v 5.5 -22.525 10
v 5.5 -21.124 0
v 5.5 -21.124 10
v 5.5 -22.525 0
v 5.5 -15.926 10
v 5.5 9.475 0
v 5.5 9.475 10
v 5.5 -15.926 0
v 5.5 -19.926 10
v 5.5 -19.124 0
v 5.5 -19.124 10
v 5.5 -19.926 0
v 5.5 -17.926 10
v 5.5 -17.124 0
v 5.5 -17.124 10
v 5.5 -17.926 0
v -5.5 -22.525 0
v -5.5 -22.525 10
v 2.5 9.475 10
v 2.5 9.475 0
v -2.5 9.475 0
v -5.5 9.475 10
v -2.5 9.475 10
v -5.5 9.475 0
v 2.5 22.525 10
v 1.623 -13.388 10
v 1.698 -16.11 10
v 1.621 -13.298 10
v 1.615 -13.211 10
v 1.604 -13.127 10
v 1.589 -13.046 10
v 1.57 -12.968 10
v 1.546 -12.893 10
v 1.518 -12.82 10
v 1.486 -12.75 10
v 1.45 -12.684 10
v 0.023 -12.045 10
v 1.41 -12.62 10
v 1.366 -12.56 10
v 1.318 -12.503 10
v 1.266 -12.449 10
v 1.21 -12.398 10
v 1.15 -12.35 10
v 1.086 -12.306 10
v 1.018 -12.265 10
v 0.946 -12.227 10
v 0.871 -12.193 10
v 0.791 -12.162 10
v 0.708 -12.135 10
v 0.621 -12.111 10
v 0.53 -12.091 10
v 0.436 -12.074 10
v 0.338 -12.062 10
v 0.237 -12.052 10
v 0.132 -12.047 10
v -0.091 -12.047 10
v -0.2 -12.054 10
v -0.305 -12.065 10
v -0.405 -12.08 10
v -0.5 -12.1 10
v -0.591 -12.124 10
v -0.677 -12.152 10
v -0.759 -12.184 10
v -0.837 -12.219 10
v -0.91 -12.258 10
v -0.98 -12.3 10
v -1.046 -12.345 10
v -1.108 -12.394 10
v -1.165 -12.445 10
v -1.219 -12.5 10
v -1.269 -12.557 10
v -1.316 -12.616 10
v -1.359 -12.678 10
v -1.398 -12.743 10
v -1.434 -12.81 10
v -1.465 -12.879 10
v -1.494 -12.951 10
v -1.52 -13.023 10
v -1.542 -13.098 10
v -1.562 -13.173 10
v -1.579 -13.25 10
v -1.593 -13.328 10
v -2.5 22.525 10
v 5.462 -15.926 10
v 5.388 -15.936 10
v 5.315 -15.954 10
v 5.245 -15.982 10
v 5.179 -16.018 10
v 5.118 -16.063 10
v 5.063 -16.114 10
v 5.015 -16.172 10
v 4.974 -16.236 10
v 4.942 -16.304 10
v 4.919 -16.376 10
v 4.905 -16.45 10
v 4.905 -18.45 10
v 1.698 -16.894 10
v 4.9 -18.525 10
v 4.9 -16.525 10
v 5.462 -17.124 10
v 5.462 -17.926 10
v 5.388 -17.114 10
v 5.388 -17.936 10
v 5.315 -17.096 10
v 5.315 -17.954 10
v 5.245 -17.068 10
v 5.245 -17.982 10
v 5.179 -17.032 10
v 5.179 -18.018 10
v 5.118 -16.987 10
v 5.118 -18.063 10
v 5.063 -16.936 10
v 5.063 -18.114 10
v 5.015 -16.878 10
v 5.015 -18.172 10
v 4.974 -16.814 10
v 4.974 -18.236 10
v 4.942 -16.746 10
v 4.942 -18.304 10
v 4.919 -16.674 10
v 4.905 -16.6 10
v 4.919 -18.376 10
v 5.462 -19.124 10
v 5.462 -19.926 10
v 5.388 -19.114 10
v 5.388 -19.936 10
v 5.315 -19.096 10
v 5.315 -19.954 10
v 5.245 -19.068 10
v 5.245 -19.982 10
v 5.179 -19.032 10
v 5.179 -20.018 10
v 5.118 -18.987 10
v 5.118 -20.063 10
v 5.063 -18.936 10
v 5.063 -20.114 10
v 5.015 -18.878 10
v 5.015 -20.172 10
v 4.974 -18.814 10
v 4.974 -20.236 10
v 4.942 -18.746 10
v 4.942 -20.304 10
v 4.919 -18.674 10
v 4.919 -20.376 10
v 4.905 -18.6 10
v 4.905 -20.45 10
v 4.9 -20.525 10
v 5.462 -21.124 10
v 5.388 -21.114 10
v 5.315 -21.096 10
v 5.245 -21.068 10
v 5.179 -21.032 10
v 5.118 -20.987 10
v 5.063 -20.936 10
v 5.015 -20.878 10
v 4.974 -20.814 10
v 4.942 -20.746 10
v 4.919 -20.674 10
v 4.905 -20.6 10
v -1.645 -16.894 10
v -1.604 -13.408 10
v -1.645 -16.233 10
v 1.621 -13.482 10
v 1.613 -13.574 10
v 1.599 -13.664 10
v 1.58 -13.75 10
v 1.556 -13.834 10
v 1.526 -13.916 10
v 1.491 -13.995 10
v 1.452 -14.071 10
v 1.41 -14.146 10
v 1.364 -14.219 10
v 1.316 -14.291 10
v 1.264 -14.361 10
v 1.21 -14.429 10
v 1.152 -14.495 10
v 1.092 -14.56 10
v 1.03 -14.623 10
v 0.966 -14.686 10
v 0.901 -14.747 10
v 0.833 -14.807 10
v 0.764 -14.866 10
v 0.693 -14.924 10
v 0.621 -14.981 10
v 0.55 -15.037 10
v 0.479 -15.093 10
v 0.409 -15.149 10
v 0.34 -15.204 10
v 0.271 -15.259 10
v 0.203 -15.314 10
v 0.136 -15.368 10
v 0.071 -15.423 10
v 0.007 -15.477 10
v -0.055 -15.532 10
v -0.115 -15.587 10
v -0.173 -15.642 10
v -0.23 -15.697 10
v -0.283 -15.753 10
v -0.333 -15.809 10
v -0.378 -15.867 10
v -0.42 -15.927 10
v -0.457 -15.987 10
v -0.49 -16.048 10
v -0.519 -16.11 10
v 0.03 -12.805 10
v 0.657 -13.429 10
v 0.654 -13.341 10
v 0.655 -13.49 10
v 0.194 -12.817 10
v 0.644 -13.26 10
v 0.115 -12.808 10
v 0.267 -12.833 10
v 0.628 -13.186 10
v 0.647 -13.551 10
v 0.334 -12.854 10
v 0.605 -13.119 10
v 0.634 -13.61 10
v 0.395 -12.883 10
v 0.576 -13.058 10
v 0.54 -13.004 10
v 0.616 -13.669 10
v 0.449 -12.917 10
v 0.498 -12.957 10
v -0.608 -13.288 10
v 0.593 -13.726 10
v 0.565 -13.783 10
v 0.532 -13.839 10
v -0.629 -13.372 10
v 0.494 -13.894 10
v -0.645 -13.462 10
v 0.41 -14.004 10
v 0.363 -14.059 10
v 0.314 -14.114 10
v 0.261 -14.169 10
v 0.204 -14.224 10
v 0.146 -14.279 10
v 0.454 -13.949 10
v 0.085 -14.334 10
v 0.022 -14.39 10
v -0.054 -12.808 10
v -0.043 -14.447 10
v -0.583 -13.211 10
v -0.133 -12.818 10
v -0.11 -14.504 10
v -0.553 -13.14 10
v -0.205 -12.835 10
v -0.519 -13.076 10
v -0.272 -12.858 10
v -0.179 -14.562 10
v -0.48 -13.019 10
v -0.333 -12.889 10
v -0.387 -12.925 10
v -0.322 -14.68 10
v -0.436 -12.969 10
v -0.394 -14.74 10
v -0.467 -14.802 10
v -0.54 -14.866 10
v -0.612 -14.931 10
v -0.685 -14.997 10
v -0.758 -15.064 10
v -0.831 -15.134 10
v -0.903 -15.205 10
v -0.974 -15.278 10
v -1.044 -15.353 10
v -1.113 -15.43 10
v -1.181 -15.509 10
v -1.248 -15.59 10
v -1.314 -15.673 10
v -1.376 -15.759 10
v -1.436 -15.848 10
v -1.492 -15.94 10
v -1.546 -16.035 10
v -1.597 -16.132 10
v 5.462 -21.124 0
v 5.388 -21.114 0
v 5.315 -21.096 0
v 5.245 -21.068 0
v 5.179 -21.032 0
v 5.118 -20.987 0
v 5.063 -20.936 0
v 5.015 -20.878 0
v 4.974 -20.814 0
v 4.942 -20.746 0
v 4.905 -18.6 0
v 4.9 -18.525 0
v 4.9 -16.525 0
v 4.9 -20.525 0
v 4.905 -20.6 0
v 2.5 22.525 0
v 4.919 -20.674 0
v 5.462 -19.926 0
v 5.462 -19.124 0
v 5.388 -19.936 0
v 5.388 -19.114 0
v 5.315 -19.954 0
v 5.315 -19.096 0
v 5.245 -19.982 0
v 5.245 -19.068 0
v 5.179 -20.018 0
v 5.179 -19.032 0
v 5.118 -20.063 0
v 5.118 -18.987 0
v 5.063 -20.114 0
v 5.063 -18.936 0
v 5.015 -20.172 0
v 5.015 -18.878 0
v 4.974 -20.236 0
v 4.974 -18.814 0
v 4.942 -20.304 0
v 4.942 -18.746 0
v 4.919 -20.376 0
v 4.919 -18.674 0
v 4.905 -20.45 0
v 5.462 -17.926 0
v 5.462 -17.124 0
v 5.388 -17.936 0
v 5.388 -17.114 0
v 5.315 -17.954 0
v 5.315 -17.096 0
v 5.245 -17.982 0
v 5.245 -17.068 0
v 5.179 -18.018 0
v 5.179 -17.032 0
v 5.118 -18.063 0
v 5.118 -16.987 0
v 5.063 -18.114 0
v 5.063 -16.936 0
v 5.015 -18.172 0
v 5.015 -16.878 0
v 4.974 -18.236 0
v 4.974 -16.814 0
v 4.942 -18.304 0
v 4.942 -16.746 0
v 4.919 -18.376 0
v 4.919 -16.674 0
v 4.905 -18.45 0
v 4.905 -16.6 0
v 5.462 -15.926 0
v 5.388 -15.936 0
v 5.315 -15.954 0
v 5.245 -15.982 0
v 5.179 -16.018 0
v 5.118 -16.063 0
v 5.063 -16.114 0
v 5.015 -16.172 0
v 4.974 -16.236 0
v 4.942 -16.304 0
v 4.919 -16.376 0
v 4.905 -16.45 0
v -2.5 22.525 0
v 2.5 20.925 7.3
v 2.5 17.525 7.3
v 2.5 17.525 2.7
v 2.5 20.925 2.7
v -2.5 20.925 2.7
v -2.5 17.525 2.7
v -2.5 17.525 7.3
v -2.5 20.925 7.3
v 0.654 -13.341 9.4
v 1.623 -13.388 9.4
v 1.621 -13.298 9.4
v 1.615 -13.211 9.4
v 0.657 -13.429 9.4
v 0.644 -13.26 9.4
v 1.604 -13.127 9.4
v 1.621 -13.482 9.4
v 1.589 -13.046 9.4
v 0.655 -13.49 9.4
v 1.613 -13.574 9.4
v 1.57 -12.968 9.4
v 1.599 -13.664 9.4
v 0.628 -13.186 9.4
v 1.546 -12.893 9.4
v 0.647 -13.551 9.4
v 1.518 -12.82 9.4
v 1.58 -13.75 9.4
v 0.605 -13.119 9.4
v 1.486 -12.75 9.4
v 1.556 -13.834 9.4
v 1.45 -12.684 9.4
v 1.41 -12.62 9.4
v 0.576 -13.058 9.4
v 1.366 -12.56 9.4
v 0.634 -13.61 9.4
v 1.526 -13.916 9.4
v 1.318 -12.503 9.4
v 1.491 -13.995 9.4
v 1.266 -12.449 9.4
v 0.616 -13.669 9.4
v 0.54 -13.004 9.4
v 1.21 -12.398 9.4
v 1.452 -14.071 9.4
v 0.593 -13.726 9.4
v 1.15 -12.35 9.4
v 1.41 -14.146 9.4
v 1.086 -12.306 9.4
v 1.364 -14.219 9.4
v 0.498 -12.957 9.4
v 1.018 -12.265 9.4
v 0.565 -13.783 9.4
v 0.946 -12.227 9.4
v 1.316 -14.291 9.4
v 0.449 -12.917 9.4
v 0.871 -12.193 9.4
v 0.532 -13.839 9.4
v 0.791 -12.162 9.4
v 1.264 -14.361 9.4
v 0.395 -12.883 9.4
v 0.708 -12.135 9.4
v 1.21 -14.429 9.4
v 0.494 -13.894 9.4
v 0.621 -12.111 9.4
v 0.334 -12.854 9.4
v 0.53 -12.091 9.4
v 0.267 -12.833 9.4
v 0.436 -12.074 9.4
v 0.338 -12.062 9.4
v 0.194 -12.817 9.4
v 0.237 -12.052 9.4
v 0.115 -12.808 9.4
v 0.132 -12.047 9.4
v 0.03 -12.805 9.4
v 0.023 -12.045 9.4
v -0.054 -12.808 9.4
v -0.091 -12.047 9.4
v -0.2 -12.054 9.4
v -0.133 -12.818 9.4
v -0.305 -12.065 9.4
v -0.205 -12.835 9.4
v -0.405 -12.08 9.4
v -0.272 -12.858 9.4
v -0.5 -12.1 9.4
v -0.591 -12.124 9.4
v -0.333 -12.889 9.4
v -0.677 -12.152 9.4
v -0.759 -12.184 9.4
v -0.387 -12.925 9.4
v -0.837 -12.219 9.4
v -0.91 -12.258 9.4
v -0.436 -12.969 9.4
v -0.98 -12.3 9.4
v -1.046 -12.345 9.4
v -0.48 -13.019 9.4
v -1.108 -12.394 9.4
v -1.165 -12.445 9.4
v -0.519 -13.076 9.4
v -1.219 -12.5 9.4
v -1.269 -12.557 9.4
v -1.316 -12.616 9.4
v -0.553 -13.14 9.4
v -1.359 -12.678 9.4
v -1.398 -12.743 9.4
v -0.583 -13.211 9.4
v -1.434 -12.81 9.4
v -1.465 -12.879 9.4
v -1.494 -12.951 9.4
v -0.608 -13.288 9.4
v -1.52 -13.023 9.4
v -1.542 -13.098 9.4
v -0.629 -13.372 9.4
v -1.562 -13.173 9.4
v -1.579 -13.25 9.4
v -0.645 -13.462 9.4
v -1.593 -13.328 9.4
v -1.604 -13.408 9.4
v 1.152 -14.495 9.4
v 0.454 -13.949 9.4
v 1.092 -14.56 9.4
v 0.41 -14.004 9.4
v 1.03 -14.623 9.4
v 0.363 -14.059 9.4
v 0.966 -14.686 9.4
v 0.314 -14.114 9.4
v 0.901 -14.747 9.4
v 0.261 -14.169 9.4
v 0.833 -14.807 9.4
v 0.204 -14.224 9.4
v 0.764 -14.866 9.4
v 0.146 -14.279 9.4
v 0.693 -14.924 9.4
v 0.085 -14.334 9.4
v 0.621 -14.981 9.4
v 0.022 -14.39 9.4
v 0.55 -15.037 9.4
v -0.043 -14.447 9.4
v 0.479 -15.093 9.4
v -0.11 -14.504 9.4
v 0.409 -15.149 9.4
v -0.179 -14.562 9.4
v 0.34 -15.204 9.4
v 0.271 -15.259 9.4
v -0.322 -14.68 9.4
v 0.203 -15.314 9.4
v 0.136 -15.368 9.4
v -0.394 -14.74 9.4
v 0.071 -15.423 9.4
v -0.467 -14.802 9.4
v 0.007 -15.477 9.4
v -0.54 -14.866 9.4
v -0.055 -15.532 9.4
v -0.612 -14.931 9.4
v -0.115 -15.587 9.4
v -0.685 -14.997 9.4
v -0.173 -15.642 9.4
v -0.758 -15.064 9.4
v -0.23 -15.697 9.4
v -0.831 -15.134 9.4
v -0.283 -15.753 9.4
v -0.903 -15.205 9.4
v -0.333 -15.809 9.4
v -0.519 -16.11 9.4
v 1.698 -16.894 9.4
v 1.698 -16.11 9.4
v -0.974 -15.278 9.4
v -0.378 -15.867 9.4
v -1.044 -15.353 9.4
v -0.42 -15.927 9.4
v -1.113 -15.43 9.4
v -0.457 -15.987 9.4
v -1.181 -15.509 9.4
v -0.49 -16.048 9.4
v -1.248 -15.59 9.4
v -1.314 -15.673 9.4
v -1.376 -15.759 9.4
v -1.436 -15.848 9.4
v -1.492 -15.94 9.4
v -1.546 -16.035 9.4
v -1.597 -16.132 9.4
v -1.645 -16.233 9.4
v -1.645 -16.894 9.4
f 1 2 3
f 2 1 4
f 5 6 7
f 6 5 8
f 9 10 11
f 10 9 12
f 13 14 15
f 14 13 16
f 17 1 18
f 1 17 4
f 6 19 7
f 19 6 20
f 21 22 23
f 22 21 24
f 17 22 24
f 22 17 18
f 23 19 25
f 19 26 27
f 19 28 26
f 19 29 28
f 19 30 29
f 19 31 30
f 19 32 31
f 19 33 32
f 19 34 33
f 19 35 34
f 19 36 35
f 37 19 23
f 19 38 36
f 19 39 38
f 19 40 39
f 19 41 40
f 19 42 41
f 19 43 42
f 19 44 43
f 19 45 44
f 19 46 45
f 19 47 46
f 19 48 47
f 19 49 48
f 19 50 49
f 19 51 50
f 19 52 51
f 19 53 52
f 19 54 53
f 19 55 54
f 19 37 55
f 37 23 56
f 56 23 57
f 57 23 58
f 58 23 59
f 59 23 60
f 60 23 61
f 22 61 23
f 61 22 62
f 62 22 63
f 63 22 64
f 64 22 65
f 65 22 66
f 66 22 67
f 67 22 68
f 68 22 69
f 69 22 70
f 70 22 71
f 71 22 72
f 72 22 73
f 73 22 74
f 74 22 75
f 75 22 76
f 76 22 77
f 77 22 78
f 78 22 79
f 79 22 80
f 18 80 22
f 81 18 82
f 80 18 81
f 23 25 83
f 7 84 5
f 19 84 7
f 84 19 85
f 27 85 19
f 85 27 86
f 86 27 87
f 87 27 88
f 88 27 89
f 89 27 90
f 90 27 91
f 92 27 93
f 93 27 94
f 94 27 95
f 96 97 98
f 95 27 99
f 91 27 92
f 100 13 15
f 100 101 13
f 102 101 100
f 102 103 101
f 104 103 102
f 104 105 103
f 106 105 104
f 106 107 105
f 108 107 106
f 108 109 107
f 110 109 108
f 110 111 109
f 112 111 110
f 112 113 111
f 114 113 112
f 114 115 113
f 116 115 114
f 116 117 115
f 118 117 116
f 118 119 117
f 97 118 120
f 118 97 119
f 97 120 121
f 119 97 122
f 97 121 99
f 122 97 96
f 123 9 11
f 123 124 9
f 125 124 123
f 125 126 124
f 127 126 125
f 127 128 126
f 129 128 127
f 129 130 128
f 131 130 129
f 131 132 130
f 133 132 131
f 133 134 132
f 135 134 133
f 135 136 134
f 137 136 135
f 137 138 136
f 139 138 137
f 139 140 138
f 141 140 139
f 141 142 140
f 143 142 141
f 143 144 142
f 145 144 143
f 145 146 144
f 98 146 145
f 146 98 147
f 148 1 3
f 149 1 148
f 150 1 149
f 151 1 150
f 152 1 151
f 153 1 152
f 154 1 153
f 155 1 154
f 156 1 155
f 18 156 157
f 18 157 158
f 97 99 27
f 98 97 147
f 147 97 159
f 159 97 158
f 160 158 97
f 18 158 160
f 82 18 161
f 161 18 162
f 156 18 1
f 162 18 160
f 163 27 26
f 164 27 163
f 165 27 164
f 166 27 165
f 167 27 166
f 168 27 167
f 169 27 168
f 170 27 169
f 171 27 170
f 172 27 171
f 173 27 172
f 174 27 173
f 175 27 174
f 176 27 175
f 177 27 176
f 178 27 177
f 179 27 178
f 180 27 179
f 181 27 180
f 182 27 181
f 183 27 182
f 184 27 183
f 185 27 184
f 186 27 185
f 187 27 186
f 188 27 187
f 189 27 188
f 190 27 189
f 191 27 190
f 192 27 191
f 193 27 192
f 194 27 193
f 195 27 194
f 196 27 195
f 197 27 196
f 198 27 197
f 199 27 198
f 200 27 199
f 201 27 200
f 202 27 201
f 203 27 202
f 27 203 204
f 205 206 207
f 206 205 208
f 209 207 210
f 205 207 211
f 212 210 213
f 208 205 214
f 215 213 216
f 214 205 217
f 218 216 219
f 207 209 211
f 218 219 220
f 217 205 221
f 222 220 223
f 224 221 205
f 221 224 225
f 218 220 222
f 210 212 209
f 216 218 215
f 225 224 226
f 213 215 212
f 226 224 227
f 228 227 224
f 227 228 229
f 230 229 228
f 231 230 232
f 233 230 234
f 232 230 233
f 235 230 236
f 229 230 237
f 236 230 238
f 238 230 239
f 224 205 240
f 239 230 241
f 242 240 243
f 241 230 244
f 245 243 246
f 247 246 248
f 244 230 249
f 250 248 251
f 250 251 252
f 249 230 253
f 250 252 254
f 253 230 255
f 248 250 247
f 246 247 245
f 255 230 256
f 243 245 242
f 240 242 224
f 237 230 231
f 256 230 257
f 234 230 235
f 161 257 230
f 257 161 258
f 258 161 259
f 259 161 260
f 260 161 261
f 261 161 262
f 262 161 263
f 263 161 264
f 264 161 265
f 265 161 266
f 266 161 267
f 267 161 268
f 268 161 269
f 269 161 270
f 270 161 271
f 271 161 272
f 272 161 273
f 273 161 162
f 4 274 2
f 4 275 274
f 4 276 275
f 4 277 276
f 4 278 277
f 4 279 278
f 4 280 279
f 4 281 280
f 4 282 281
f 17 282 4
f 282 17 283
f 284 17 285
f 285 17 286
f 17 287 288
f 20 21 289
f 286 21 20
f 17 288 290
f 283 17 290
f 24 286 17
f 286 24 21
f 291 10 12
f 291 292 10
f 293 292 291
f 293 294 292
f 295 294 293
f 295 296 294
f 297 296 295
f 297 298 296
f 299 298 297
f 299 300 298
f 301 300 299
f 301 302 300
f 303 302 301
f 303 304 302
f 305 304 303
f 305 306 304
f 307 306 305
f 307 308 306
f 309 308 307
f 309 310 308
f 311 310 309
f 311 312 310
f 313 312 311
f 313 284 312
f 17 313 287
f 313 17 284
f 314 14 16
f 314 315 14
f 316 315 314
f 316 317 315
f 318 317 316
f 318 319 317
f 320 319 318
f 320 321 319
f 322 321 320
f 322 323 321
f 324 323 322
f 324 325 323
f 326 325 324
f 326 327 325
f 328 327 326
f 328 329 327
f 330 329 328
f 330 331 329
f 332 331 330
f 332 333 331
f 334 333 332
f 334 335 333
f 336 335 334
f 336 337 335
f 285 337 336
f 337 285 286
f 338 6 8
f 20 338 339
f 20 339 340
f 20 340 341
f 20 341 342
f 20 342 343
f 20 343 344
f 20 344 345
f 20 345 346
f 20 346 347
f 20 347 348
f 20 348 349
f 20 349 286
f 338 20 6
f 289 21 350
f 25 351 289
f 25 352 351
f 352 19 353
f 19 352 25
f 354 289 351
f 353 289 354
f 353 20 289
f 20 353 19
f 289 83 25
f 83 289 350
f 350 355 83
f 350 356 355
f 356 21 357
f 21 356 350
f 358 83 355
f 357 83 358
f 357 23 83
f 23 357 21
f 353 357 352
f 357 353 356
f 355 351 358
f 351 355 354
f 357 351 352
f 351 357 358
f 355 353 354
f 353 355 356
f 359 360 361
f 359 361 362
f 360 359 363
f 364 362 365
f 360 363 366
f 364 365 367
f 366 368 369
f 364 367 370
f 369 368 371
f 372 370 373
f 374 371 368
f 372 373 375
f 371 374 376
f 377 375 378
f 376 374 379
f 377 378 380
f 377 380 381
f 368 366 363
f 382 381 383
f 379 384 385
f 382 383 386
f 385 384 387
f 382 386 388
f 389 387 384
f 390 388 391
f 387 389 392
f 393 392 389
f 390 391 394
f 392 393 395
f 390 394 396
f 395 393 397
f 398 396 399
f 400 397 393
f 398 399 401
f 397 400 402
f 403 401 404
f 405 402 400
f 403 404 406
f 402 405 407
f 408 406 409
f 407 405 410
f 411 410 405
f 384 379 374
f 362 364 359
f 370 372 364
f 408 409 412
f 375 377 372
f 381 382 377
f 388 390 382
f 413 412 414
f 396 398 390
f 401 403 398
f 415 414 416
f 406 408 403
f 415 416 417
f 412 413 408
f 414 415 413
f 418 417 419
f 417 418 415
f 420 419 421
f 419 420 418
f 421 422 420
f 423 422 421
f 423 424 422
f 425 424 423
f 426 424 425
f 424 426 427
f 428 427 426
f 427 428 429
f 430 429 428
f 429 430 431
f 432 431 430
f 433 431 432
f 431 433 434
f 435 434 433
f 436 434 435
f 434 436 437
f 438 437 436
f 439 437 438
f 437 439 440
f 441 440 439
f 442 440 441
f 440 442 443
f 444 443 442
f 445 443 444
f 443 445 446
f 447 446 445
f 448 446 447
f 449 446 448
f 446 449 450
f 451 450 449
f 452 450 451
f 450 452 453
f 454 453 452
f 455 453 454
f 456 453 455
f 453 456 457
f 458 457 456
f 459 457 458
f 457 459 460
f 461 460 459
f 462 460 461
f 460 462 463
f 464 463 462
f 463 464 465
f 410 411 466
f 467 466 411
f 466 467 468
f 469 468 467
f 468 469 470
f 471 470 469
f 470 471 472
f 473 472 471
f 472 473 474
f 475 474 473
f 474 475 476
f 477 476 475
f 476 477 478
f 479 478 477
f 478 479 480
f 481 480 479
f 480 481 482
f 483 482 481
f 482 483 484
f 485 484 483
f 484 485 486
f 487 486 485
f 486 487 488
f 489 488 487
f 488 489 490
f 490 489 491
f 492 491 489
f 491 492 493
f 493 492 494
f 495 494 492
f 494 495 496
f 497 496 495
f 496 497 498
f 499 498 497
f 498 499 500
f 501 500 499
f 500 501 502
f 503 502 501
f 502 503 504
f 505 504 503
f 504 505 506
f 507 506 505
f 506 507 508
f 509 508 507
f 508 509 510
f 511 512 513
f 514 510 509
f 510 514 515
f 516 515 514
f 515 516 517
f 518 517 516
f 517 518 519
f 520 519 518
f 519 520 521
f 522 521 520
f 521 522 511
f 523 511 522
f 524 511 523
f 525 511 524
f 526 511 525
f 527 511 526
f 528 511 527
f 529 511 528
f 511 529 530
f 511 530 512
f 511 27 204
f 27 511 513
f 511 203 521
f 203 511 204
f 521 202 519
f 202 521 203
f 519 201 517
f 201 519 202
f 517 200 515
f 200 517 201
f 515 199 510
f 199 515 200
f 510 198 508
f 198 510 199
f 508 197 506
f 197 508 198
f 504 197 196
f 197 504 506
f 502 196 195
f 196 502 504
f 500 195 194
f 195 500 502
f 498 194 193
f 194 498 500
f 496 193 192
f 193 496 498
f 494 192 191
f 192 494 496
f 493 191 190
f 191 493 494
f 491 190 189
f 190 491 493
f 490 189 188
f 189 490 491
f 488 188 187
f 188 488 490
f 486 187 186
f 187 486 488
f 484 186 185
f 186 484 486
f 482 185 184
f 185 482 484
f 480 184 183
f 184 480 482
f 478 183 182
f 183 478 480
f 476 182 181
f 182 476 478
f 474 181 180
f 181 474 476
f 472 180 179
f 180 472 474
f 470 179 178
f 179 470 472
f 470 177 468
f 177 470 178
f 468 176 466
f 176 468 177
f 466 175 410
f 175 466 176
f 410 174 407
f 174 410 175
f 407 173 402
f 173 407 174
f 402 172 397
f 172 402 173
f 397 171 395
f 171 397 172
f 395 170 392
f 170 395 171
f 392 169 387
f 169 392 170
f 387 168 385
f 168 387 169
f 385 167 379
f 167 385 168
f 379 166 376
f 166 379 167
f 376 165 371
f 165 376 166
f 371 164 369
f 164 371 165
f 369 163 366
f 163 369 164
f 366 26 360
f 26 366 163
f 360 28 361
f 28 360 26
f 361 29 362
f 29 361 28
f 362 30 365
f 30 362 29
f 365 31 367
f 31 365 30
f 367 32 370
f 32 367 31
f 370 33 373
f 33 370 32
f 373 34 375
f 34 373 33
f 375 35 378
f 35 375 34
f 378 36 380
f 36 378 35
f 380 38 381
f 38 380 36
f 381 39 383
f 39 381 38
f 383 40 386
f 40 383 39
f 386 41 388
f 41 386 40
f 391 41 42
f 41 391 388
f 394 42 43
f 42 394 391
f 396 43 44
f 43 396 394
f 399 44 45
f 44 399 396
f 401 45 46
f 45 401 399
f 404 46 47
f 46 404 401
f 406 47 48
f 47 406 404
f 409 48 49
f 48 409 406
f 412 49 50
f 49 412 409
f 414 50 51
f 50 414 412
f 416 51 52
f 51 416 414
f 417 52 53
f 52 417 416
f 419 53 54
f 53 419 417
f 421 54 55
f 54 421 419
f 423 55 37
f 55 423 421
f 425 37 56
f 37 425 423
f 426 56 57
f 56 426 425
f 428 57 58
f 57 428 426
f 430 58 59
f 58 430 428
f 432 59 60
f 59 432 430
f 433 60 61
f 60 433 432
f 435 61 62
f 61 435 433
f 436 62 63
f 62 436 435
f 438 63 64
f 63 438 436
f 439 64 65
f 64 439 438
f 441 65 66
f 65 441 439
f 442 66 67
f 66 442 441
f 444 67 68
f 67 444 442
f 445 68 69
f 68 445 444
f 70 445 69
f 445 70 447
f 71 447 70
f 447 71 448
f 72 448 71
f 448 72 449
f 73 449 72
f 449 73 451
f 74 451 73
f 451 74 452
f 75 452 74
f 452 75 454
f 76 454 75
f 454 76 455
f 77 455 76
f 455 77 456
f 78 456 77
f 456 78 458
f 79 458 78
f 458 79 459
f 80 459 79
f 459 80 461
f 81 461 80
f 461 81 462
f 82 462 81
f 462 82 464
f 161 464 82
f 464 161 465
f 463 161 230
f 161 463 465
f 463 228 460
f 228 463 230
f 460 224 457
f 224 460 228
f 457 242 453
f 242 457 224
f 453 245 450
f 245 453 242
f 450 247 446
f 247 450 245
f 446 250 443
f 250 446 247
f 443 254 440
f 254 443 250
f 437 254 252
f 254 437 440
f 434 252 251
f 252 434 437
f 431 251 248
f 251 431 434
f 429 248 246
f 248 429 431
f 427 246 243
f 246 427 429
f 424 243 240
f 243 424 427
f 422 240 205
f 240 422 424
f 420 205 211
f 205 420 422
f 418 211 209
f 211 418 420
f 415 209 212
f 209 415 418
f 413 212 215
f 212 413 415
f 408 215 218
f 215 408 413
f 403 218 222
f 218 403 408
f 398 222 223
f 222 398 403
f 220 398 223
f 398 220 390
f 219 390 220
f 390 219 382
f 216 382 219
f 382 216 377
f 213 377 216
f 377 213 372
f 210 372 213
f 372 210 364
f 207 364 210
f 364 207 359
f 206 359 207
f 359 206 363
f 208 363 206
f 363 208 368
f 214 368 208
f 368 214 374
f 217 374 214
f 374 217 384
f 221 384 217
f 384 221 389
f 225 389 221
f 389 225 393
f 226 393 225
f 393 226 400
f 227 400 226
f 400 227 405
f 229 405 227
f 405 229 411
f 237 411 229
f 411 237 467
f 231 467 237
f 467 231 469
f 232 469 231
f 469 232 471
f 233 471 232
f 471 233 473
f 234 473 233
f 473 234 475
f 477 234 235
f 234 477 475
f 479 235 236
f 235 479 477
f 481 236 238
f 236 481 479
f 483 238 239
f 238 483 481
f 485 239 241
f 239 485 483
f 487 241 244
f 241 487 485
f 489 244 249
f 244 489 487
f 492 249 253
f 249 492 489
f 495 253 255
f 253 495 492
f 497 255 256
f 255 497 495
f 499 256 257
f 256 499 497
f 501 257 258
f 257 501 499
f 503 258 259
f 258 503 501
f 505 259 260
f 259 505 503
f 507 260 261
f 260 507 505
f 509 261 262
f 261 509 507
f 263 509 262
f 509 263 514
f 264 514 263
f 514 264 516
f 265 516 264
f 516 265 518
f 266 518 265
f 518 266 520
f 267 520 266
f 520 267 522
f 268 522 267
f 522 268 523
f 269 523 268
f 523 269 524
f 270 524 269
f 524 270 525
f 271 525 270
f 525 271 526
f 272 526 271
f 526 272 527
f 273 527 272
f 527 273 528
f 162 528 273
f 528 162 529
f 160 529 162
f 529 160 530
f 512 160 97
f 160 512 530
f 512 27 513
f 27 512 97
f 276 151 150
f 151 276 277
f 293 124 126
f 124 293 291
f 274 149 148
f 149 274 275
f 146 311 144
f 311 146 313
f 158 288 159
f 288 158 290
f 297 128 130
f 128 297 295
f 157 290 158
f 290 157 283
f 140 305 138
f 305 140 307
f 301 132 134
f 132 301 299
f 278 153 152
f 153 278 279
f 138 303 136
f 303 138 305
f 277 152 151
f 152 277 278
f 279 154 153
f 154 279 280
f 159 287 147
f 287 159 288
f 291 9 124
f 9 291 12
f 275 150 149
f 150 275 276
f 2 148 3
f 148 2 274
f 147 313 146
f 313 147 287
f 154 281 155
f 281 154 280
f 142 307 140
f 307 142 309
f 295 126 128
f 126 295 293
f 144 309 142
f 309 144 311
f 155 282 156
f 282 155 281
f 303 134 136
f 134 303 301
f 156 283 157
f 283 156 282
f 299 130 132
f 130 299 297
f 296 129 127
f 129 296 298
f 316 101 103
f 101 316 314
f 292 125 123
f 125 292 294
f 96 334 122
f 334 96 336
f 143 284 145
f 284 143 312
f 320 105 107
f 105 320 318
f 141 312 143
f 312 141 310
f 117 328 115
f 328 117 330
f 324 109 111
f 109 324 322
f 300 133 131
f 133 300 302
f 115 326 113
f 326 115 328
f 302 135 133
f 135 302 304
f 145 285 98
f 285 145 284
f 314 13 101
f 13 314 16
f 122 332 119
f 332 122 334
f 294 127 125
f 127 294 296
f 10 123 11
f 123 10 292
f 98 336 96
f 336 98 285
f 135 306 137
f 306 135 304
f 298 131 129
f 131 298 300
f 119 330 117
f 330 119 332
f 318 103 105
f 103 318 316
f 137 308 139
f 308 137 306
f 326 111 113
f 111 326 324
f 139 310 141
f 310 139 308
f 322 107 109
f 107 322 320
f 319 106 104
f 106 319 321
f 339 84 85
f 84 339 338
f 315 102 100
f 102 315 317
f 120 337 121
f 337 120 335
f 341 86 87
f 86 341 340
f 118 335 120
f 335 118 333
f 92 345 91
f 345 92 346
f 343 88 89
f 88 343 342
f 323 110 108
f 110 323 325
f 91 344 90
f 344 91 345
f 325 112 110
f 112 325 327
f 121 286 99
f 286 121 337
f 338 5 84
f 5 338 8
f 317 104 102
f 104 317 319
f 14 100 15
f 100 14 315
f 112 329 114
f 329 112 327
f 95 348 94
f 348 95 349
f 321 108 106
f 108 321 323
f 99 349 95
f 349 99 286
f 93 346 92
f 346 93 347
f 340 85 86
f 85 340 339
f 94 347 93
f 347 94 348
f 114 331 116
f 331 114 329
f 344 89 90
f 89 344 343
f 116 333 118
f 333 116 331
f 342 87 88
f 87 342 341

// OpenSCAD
$fn = 50;

difference() {
	union() {
		translate(v = [0, 9.475, 0]) {
			rotate(a = [90, 0, 0]) {
				difference() {
					union() {
						translate(v = [-5.5, 0, 0]) {
							cube(size = [11.0, 10.0, 32.0]);
						}
						translate(v = [-2.5, 0, -13.05]) {
							cube(size = [5.0, 10.0, 13.15]);
						}
					}
					union() {
						translate(v = [-2.6, 2.7, -11.450000000000001]) {
							cube(size = [5.2, 4.6, 3.4]);
						}
						translate(v = [0, 9.4, 24.0]) {
							rotate(a = [-90, 0, 0]) {
								linear_extrude(height = 0.7) {
									text(font = "Arial:style=Bold", halign = "center", size = 5.0, text = "2", valign = "center");
								}
							}
						}
						translate(v = [5.5, 10.1, 30.0]) {
							rotate(a = [90, 0, 0]) {
								cylinder(h = 10.2, r = 0.6);
							}
						}
						translate(v = [5.5, 10.1, 28.0]) {
							rotate(a = [90, 0, 0]) {
								cylinder(h = 10.2, r = 0.6);
							}
						}
						translate(v = [5.5, 10.1, 26.0]) {
							rotate(a = [90, 0, 0]) {
								cylinder(h = 10.2, r = 0.6);
							}
						}
					}
				}
			}
		}
	}
	union();
}
